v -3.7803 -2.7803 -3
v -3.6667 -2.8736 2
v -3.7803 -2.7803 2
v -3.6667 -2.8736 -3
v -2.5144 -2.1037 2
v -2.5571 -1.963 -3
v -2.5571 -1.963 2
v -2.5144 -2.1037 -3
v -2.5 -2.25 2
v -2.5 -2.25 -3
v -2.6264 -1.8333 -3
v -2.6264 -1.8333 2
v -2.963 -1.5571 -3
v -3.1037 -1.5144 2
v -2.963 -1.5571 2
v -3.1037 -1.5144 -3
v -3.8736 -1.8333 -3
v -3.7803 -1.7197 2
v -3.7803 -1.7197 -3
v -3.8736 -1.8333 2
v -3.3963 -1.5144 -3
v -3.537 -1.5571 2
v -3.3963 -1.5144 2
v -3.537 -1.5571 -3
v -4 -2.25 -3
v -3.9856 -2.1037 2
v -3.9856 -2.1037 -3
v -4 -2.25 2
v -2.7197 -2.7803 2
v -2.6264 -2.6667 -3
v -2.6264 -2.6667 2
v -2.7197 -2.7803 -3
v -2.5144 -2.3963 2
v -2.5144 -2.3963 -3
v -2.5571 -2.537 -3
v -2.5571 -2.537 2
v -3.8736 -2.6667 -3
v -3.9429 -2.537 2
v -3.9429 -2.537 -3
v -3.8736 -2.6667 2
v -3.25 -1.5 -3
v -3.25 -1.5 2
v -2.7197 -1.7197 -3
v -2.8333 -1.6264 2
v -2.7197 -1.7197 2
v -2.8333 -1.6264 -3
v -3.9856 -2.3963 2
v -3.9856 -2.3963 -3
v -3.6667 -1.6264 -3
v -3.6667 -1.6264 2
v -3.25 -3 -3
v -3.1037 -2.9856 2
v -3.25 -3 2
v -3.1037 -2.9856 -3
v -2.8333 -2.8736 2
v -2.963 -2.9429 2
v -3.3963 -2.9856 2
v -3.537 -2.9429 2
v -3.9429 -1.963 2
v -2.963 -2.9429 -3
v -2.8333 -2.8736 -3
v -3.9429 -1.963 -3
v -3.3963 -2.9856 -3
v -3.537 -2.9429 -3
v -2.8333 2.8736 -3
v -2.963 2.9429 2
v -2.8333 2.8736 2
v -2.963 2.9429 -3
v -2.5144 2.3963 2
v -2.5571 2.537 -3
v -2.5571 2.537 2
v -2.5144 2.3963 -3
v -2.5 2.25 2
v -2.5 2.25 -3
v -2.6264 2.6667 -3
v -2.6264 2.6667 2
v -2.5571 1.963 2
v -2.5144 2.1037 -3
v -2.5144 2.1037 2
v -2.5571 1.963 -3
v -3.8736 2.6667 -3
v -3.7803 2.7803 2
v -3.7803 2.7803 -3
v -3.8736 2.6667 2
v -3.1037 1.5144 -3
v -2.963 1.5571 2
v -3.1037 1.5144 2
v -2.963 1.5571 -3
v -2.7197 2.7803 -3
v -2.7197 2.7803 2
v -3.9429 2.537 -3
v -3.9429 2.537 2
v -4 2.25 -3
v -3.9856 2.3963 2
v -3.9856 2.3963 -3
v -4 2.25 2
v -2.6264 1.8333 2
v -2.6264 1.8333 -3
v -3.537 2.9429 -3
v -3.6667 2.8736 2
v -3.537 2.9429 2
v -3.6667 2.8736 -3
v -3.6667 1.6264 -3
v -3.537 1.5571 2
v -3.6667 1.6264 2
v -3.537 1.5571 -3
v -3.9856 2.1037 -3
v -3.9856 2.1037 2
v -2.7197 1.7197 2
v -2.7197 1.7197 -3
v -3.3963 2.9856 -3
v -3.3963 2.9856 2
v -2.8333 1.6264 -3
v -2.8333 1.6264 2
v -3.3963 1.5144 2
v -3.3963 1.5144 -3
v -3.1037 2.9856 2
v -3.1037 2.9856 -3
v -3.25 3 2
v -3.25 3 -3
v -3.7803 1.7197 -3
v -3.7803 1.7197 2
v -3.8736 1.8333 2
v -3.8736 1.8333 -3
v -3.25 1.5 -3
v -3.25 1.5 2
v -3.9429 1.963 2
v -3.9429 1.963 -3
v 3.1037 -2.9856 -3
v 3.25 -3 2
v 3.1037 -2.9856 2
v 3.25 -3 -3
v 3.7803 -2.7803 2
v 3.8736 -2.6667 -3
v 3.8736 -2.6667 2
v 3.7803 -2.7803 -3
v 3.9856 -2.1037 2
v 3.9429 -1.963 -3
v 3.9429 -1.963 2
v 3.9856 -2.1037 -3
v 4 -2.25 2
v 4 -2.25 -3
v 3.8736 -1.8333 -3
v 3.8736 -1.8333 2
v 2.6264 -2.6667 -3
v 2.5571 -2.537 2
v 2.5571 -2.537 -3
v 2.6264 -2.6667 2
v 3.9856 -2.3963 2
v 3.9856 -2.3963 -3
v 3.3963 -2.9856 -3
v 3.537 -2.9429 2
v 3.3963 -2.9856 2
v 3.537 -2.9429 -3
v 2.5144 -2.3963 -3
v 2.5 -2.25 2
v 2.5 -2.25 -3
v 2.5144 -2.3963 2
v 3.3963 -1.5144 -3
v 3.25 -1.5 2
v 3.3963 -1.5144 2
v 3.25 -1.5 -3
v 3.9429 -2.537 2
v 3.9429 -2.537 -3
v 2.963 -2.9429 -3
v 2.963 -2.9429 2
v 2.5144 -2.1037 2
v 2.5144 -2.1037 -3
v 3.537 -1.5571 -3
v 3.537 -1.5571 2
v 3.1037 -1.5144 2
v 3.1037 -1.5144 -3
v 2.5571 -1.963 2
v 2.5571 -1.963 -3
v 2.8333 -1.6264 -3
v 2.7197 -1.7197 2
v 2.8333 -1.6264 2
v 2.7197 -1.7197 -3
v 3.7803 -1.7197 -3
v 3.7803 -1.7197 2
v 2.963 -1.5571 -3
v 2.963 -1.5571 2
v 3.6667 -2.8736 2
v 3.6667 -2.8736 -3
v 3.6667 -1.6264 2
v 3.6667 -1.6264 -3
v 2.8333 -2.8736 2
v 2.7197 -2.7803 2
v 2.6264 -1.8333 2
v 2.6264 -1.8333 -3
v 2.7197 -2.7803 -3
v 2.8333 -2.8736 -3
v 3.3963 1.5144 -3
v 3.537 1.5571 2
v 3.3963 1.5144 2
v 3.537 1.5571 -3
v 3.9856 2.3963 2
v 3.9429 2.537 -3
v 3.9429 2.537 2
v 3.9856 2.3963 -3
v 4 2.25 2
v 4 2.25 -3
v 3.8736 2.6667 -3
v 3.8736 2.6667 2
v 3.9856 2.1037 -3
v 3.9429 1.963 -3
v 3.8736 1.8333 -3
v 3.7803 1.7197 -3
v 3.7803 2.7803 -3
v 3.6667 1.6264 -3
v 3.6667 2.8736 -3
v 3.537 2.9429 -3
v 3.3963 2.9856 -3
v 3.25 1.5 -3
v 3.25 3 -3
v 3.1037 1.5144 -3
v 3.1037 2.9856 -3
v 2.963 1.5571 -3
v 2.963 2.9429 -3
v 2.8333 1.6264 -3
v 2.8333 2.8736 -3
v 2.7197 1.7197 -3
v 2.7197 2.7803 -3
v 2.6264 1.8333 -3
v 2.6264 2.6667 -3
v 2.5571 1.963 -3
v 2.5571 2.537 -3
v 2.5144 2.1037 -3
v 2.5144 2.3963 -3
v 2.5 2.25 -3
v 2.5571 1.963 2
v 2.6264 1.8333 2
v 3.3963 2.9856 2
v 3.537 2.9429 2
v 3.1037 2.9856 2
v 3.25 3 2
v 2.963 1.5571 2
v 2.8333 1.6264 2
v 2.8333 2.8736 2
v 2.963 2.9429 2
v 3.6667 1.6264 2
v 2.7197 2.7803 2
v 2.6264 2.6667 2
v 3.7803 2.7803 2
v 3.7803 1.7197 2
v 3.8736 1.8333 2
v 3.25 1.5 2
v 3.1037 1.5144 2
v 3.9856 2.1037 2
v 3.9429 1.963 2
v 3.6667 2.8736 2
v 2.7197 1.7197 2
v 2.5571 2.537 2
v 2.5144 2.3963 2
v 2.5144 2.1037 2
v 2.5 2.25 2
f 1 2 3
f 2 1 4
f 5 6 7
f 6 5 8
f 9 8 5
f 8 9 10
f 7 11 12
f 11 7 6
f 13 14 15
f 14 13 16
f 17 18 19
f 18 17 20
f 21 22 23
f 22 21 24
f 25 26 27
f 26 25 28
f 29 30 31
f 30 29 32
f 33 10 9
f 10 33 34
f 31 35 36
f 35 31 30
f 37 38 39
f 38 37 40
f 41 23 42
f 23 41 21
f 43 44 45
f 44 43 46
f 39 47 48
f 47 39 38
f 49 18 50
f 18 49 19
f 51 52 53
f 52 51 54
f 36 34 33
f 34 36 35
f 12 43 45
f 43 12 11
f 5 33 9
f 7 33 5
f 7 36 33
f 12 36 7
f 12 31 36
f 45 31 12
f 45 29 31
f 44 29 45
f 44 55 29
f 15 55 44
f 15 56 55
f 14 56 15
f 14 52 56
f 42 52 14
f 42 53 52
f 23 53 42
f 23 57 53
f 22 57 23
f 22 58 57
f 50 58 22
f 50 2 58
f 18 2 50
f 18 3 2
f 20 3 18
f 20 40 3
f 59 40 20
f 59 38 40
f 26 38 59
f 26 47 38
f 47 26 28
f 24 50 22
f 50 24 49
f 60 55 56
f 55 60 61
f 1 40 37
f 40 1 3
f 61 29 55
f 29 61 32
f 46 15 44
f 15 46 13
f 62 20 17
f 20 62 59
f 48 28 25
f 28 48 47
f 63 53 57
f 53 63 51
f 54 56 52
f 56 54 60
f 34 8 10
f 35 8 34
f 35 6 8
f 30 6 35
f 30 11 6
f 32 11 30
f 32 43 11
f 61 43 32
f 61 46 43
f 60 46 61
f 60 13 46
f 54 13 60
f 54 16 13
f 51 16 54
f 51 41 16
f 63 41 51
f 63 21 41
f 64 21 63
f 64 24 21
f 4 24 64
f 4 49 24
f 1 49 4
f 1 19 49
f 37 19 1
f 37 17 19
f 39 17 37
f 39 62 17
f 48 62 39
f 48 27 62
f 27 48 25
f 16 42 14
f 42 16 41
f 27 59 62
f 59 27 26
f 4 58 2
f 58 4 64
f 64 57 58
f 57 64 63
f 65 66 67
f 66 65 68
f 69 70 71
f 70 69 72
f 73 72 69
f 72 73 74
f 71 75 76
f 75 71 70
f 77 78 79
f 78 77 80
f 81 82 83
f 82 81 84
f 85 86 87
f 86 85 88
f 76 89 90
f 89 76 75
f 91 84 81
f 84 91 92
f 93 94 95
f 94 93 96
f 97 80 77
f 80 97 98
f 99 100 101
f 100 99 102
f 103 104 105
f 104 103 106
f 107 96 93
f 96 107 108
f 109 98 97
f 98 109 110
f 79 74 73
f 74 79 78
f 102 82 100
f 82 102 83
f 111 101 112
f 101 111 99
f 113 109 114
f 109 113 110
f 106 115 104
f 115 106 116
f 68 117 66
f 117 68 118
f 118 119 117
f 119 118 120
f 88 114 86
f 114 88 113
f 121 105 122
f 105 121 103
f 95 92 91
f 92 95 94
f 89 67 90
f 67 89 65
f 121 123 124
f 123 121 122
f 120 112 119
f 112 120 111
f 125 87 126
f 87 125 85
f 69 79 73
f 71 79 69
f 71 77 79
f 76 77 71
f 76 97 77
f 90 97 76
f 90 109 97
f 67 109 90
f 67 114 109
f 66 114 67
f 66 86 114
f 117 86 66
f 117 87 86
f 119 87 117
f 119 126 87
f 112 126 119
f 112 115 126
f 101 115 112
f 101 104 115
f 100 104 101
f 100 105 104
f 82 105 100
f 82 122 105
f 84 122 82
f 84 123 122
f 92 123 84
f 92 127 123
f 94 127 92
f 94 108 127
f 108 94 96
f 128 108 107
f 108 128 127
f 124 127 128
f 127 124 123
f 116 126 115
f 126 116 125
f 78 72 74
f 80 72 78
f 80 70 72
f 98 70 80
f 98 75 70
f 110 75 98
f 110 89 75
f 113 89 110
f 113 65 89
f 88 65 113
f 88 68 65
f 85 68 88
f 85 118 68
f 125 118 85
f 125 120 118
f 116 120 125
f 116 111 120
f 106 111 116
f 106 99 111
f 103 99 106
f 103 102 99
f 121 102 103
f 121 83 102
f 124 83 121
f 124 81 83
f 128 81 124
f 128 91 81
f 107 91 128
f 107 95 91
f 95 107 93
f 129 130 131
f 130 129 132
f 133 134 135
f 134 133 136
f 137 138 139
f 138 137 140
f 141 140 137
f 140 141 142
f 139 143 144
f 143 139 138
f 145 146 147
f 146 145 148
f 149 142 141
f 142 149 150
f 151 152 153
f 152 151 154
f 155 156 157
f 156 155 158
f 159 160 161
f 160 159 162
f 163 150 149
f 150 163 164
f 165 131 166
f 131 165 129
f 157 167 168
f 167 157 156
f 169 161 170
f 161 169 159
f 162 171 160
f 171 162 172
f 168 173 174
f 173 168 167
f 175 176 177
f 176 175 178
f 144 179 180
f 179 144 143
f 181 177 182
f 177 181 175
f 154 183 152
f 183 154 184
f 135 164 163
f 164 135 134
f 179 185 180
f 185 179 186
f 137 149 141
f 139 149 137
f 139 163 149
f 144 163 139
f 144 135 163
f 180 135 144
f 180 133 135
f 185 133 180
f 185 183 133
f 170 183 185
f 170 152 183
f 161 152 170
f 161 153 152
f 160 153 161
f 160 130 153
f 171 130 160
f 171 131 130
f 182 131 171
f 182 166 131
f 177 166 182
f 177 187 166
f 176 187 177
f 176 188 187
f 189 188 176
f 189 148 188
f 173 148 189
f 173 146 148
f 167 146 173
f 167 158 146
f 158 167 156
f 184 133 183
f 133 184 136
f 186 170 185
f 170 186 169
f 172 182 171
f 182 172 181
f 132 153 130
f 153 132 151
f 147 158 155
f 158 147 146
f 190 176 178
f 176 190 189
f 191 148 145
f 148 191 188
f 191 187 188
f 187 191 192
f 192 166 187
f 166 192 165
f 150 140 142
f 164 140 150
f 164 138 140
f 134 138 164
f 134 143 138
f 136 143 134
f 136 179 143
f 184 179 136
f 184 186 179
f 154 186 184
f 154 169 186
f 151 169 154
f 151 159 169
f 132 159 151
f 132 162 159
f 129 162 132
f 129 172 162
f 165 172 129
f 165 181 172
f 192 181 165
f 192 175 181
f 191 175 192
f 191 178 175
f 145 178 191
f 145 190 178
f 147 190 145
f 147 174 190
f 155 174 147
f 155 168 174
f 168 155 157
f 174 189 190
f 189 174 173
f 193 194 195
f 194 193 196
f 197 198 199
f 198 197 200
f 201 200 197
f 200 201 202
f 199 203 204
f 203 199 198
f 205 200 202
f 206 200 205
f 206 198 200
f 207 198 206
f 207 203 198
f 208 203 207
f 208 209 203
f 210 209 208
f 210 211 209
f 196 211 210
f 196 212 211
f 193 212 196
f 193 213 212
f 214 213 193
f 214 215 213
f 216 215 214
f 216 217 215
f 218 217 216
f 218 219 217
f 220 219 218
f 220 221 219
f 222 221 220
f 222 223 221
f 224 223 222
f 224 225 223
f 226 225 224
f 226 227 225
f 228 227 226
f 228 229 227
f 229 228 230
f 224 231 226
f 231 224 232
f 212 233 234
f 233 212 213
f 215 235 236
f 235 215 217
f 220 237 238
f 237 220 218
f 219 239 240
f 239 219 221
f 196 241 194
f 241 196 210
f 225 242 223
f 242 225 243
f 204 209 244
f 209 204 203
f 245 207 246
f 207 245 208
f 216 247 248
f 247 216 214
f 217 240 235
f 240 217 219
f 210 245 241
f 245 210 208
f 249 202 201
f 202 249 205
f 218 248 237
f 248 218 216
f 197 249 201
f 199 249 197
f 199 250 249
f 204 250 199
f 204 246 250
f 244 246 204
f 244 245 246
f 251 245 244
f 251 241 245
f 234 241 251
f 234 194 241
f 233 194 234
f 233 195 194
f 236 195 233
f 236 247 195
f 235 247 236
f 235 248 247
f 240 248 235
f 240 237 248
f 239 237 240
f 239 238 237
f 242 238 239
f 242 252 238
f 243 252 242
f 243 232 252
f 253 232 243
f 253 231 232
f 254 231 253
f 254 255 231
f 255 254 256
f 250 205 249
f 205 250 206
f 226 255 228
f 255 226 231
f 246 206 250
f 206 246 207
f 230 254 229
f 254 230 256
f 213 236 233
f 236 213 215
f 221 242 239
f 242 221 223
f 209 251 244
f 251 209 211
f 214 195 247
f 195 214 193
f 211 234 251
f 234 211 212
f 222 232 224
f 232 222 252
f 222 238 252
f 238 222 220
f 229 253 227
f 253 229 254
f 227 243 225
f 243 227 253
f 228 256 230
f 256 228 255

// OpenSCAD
/**
 * Martin Egli
 * 2023-09-13
 */

module origin(col = "red", loc_res = 5, height = 20) {
    color(col)
    cylinder(d1 = 0, d2 = 1, h = 20, $fn = loc_res);
}

//TC20-11RWA
module ledsTC2011RWA(loc_res = 32, show_origin = 1) {
    // origin: center
    if(show_origin) {
        translate([0, 0, 0])
        origin();
    }
    
    translate([-6/2*2.54, -38.1/2, 0]) {
        // pins
        color("LightGray") {
            // pins 1 - 7
            translate([0, 0, -4])
            for(n = [0:1:6]) {
                translate([n*2.54, 0, 0])
                rotate([0, 0, 45])
                cylinder(d = 0.5, h = 4, $fn = 4);
            }
            // pins 8 - 14
            translate([0, 38.1, -4])
            for(n = [0:1:6]) {
                translate([n*2.54, 0, 0])
                rotate([0, 0, 45])
                cylinder(d = 0.5, h = 4, $fn = 4);
            }
        }
        deltax = (37.7-(6*2.54))/2;
        deltay = (53-38.1)/2;
        // case
        color("White")
        translate([-deltax, -deltay, 0])
        cube([37.7-0.1, 53, 8.45]);
        
        deltax2 = (37.7 - 4*7.62)/2;
        deltay2 = (53 - 6*7.62)/2;
        leddia = 5.0;
        color("Red")
        translate([-(deltax-deltax2), -deltay2, 8.45]) {
            for(m = [0:1:6]) {
                for(n = [0:1:4]) {
                    translate([n*7.62, m*7.62, 0])
                    cylinder(d = leddia, h = 0.1, $fn = loc_res);
                }
            }
        }
    }
}

//TC20-11RWA
module ledsTC2011RWA_cut(loc_res = 32, cut_height = 10, show_origin = 1) {
    // origin: center
    if(show_origin) {
        translate([0, 0, 0])
        origin();
    }
    
    translate([-6/2*2.54, -38.1/2, 0]) {
        deltax = (37.7-(6*2.54))/2+0.2;
        deltay = (53-38.1)/2+0.2;
        // case
        translate([-deltax, -deltay, 0])
        cube([37.7-0.1+0.2*2, 53+0.2*2, cut_height]);
    }
}

//TC20-11RWA
module ledsTC2011RWA_chtholes(loc_res = 32) {
    translate([-6/2*2.54, -38.1/2, 0]) {
        // pins
        color("LightGray") {
            // pins 1 - 7
            translate([0, 0, -4])
            for(n = [0:1:6]) {
                translate([n*2.54, 0, 0])
                rotate([0, 0, 45])
                cylinder(d = 1, h = 5, $fn = loc_res);
            }
            // pins 8 - 14
            translate([0, 38.1, -4])
            for(n = [0:1:6]) {
                translate([n*2.54, 0, 0])
                rotate([0, 0, 45])
                cylinder(d = 1, h = 5, $fn = loc_res);
            }
        }
    }
}
//ledsTC2011RWA();
//ledsTC2011RWA_cut();
//ledsTC2011RWA_chtholes();

//TS02-66-95-BK-260-LCR-D
module buttonTS0266(height = 6, loc_res = 32, show_origin = 1) {
    // origin: center
    if(show_origin) {
        translate([0, 0, 0])
        origin();
    }
    // button
    color("Black")
    translate([0, 0, 0])
    cylinder(d = 4, h = height, $fn = loc_res);
    
    // body
    color("Black")
    translate([-3, -3, 0])
    cube([6, 6, 3.5-0.1]);
    color("LightGray")
    translate([-3, -3, 3.5-0.1])
    cube([6, 6, 0.1]);
    
    // THT
    color("LightGray") {
        translate([-6.5/2, -4.5/2, -3])
        cylinder(d = 1.0, h = 4, $fn = loc_res);
        translate([-6.5/2, +4.5/2, -3])
        cylinder(d = 1.0, h = 4, $fn = loc_res);
        translate([+6.5/2, -4.5/2, -3])
        cylinder(d = 1.0, h = 4, $fn = loc_res);
        translate([+6.5/2, +4.5/2, -3])
        cylinder(d = 1.0, h = 4, $fn = loc_res);
    }
}

module buttonTS026695(loc_res = 32, show_origin = 1) {
    buttonTS0266(9.5, loc_res, show_origin);
}

module buttonTS0266_cut(height = 12, loc_res = 32, show_origin = 1) {
    // origin: center
    if(show_origin) {
        translate([0, 0, 0])
        origin();
    }
    // button
    translate([0, 0, 0])
    cylinder(d = 5, h = height, $fn = loc_res);
    // body
    translate([-3.5, -3.5, 0])
    cube([7, 7, 3.7]);
}

module buttonTS0266_cutholes(loc_res = 32) {
    // origin: center
    translate([-6.5/2, -4.5/2, -3])
    cylinder(d = 1.5, h = 5, $fn = loc_res);
    translate([-6.5/2, +4.5/2, -3])
    cylinder(d = 1.5, h = 5, $fn = loc_res);
    translate([+6.5/2, -4.5/2, -3])
    cylinder(d = 1.5, h = 5, $fn = loc_res);
    translate([+6.5/2, +4.5/2, -3])
    cylinder(d = 1.5, h = 5, $fn = loc_res);
}

//buttonTS026695();
buttonTS0266_cutholes();

module switchMFP140_5x(loc_res = 32, show_origin = 1) {
    // origin: center
    if(show_origin) {
        translate([0, 0, 0])
        origin();
    }
    color("Silver")
    translate([-18.2/2, -6/2, -5.6/2])
    cube([18.2, 6, 5.6]);
    color("Black")
    translate([-2*3.2, 6/2, -3.4/2])
    cube([3.4, 5, 3.4]);
    // pins, 5x
    color("Silver")
    for(n = [0:1:4]) {
        translate([-2*3.2+n*3.2, -3.4-6/2, 0])
        rotate([-90, 0, 0])
        rotate([0, 0, 45])
        cylinder(d = 1, h = 4, $fn = 4);
    }
}

module switchMFP140_5x_cut() {
    translate([-18.6/2, -6.4/2, -6/2])
    cube([18.6, 6.4, 6]);
}
//switchMFP140_5x();
//switchMFP140_5x_cut();
